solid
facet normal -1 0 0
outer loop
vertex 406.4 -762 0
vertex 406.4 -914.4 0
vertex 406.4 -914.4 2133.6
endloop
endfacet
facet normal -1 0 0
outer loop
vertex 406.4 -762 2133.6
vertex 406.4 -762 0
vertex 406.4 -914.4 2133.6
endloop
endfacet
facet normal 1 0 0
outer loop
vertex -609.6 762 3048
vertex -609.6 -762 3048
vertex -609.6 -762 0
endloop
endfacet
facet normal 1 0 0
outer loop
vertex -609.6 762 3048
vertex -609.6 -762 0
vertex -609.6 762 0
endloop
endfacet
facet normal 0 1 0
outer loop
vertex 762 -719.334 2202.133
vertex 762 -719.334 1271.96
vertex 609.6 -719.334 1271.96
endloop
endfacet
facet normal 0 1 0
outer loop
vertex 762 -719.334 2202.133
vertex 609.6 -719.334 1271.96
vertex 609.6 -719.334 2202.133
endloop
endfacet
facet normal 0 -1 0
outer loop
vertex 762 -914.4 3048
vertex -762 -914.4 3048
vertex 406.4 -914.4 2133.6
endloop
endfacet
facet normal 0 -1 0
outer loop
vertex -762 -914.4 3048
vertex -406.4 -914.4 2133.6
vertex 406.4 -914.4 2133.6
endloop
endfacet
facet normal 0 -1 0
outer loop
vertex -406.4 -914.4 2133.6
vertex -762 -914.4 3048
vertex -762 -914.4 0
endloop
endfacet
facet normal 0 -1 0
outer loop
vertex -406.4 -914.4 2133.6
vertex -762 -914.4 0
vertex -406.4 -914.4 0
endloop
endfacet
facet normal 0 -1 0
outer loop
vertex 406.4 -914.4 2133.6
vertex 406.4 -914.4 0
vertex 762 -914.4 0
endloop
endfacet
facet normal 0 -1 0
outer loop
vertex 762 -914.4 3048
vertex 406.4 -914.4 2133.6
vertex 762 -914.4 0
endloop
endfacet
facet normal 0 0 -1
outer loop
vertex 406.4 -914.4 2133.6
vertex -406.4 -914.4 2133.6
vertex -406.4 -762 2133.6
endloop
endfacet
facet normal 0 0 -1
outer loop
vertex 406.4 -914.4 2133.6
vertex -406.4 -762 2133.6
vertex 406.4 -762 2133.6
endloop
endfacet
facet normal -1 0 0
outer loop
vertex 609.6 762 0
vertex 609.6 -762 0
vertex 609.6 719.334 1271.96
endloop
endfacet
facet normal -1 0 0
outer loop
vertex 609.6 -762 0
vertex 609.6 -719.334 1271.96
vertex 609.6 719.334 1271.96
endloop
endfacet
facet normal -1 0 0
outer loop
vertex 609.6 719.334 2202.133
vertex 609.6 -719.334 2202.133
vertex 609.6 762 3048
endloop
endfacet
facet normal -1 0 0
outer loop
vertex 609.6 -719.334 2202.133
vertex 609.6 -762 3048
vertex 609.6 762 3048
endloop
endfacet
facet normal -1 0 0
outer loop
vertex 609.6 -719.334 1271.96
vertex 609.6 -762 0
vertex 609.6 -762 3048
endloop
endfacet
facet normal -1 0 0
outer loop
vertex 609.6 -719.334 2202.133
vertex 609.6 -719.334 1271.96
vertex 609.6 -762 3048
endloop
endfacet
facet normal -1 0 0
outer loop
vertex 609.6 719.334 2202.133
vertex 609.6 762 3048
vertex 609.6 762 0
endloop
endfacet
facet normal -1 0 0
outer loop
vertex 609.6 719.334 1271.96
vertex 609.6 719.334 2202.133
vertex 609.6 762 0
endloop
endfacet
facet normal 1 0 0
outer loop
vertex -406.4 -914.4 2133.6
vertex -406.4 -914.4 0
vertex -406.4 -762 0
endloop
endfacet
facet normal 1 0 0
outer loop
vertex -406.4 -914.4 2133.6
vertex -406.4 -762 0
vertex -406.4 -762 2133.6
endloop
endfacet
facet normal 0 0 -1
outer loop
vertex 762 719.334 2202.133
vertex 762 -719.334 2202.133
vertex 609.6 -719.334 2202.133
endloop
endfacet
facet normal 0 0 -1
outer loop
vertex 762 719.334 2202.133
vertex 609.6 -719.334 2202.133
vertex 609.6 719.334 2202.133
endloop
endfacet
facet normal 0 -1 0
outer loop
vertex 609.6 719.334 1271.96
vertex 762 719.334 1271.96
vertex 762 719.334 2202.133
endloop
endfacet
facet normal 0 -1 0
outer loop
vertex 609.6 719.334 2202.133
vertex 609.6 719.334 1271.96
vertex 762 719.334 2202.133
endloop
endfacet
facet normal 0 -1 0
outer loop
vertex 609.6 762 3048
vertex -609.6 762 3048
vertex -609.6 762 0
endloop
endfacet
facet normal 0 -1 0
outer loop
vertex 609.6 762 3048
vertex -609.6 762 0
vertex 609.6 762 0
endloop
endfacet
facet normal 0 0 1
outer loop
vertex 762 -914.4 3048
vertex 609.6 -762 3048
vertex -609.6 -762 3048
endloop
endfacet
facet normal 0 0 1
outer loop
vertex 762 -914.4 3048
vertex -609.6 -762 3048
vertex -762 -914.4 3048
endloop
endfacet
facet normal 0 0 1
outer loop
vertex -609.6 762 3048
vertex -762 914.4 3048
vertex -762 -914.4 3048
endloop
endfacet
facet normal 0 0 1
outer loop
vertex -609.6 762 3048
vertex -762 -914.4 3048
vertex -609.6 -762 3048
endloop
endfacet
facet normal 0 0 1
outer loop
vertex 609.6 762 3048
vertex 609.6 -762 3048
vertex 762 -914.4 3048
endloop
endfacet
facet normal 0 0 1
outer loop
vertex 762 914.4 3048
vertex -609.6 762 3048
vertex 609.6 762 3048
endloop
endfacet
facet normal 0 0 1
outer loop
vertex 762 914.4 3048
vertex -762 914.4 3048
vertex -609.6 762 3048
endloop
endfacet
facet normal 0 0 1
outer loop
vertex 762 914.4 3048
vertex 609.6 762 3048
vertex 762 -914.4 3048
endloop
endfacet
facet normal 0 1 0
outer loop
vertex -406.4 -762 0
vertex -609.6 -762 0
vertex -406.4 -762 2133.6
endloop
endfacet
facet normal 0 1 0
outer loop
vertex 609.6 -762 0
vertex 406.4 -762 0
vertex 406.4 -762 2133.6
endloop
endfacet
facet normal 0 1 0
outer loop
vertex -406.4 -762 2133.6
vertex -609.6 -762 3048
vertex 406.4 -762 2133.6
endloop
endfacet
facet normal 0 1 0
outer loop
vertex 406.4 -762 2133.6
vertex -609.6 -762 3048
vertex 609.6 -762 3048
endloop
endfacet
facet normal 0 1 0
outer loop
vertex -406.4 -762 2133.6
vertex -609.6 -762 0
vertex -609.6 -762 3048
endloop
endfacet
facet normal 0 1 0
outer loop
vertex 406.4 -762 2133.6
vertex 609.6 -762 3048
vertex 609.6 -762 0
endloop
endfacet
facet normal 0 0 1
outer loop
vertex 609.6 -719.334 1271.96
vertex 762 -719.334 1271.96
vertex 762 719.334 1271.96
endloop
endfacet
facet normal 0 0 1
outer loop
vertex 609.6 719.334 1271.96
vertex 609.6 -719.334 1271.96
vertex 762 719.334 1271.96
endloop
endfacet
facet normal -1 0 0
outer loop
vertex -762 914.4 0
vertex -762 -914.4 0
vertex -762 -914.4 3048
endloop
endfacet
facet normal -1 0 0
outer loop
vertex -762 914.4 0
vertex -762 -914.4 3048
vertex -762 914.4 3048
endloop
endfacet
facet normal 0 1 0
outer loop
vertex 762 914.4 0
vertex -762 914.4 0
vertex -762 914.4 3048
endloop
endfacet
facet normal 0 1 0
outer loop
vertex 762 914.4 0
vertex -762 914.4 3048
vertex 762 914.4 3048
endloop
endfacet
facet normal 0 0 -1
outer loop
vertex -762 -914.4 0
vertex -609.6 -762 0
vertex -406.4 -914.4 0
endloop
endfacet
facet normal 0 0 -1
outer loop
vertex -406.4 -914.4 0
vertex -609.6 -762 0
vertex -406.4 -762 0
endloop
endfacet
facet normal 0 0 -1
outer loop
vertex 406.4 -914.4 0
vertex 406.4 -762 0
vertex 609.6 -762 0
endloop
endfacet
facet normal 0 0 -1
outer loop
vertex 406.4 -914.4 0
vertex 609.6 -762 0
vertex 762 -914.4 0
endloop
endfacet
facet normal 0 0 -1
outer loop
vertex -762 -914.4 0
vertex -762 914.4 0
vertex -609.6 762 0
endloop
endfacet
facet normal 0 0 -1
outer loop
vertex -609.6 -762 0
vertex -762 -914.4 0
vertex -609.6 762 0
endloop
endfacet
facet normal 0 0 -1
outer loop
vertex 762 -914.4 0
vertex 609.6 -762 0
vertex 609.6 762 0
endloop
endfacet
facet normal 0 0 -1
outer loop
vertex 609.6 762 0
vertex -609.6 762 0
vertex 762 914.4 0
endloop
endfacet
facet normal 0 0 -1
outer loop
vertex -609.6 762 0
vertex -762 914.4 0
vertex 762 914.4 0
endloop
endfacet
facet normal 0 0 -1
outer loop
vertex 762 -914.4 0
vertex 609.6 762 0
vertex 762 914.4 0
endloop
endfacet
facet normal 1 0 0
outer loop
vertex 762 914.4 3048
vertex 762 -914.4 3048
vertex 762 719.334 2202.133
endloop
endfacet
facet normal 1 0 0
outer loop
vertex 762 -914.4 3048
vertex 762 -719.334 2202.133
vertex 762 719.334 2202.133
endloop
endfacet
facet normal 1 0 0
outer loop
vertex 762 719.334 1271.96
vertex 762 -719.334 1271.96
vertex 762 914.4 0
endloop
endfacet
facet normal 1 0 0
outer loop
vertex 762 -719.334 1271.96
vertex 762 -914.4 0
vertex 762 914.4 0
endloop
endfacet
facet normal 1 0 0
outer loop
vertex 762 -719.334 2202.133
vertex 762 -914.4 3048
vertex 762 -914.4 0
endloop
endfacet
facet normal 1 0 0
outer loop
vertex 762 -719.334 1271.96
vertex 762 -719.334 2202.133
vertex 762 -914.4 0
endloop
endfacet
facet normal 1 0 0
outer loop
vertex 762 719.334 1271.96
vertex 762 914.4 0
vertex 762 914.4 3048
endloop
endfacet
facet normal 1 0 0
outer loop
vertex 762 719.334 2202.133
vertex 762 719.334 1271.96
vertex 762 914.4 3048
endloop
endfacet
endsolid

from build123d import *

# Parameters (mm, degrees)
F0_W     = 1524
F0_H     = 1828.8
F1_DEPTH = 3048
F2_W     = 1219.2
F2_H     = 1524
F3_DEPTH = 3048
F4_W     = 812.8
F4_H     = 2133.6
F5_DEPTH = 203.2
F6_W     = 1438.667654
F6_H     = 930.172921
F7_DEPTH = 203.2


with BuildPart() as f1:
    # F0 (on Top) → F1 (new body)
    with BuildSketch(Plane.XY):
        Rectangle(F0_W, F0_H)
    extrude(amount=F1_DEPTH)

    # F2 (on face) → F3 (cut)
    with BuildSketch(Plane.XY.offset(3048)):
        Rectangle(F2_W, F2_H)
    extrude(amount=-F3_DEPTH, mode=Mode.SUBTRACT)

    # F4 (on face) → F5 (cut)
    with BuildSketch(Plane.XZ.offset(914.4)):
        with Locations((0, 1066.8)):
            Rectangle(F4_W, F4_H)
    extrude(amount=-F5_DEPTH, mode=Mode.SUBTRACT)

    # F6 (on face) → F7 (cut)
    with BuildSketch(Plane.YZ.offset(762)):
        with Locations((0, 1737.046718)):
            Rectangle(F6_W, F6_H)
    extrude(amount=-F7_DEPTH, mode=Mode.SUBTRACT)


solid = f1.part
